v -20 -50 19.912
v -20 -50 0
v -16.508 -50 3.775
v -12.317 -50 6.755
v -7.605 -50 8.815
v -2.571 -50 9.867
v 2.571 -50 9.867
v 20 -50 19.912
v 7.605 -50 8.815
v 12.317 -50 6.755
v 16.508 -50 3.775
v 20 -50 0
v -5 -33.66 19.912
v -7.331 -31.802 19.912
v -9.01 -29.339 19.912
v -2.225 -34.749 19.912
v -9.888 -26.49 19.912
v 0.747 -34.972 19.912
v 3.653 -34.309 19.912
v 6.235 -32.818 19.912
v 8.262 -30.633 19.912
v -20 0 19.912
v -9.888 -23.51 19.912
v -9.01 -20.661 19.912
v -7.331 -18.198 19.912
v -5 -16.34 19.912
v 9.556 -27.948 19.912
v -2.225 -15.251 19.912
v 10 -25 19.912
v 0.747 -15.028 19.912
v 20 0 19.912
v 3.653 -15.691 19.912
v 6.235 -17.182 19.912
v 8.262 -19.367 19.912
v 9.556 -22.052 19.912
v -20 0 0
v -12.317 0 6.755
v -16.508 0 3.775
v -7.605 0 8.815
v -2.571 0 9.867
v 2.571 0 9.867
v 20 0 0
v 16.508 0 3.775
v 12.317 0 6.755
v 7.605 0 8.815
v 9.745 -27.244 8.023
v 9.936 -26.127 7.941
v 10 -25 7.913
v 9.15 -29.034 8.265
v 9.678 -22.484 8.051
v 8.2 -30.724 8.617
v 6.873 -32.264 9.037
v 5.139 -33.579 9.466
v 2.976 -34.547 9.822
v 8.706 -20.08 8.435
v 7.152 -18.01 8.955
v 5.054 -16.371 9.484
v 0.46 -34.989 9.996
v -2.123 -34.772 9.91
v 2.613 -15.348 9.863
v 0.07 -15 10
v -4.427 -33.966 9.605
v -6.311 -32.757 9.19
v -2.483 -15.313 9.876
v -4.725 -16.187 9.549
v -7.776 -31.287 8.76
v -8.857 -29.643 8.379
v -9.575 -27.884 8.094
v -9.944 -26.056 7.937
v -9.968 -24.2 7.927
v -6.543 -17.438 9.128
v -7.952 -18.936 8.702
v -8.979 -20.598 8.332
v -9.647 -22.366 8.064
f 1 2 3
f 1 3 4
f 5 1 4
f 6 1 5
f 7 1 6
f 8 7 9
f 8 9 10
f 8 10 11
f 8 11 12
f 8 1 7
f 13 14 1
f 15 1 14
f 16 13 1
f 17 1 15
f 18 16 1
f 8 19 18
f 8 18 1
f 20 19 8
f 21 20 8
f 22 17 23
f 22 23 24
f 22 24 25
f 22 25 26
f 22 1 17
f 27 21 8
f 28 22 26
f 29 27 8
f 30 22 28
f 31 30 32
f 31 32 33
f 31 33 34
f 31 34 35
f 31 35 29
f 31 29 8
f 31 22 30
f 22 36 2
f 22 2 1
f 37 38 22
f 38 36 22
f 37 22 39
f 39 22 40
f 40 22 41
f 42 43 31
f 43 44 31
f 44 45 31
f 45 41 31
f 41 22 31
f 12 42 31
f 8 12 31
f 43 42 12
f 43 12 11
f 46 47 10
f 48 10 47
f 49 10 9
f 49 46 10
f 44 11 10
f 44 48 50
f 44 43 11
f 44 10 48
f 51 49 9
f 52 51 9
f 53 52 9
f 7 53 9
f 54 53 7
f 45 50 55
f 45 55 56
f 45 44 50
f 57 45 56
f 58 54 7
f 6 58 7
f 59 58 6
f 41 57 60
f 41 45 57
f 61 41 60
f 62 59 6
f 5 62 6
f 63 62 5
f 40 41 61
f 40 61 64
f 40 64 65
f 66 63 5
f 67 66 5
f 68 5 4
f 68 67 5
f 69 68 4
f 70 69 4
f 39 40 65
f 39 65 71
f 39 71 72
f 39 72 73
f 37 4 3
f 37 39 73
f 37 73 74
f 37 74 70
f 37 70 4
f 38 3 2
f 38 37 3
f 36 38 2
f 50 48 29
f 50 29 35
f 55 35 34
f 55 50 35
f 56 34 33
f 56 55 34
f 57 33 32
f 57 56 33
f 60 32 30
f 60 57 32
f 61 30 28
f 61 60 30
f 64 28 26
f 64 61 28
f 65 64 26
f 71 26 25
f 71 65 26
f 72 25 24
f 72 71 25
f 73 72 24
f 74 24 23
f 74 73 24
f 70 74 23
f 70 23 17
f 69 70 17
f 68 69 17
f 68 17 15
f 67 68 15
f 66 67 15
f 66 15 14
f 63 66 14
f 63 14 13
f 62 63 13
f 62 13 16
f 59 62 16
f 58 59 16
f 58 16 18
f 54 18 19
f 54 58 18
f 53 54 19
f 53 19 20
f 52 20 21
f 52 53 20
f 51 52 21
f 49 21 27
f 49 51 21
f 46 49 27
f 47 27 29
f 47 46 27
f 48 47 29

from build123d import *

# Parameters (mm, degrees)
F0_W     = 40
F0_H     = 20
F1_DEPTH = 50
F2_R     = 25
F3_DEPTH = 50.001
F4_R     = 10
F5_DEPTH = 19.913378


with BuildPart() as f1:
    # F0 (on Front) → F1 (new body)
    with BuildSketch(Plane.XZ):
        with Locations((0, 9.912378)):
            Rectangle(F0_W, F0_H)
    extrude(amount=F1_DEPTH)

    # F2 (on Front) → F3 (cut, through all)
    with BuildSketch(Plane.XZ):
        with Locations((0, -15)):
            Circle(F2_R)
    extrude(amount=F3_DEPTH, mode=Mode.SUBTRACT)

    # F4 (on Top) → F5 (cut, through all)
    with BuildSketch(Plane.XY):
        with Locations((0, -25)):
            Circle(F4_R)
    extrude(amount=F5_DEPTH, mode=Mode.SUBTRACT)


solid = f1.part
